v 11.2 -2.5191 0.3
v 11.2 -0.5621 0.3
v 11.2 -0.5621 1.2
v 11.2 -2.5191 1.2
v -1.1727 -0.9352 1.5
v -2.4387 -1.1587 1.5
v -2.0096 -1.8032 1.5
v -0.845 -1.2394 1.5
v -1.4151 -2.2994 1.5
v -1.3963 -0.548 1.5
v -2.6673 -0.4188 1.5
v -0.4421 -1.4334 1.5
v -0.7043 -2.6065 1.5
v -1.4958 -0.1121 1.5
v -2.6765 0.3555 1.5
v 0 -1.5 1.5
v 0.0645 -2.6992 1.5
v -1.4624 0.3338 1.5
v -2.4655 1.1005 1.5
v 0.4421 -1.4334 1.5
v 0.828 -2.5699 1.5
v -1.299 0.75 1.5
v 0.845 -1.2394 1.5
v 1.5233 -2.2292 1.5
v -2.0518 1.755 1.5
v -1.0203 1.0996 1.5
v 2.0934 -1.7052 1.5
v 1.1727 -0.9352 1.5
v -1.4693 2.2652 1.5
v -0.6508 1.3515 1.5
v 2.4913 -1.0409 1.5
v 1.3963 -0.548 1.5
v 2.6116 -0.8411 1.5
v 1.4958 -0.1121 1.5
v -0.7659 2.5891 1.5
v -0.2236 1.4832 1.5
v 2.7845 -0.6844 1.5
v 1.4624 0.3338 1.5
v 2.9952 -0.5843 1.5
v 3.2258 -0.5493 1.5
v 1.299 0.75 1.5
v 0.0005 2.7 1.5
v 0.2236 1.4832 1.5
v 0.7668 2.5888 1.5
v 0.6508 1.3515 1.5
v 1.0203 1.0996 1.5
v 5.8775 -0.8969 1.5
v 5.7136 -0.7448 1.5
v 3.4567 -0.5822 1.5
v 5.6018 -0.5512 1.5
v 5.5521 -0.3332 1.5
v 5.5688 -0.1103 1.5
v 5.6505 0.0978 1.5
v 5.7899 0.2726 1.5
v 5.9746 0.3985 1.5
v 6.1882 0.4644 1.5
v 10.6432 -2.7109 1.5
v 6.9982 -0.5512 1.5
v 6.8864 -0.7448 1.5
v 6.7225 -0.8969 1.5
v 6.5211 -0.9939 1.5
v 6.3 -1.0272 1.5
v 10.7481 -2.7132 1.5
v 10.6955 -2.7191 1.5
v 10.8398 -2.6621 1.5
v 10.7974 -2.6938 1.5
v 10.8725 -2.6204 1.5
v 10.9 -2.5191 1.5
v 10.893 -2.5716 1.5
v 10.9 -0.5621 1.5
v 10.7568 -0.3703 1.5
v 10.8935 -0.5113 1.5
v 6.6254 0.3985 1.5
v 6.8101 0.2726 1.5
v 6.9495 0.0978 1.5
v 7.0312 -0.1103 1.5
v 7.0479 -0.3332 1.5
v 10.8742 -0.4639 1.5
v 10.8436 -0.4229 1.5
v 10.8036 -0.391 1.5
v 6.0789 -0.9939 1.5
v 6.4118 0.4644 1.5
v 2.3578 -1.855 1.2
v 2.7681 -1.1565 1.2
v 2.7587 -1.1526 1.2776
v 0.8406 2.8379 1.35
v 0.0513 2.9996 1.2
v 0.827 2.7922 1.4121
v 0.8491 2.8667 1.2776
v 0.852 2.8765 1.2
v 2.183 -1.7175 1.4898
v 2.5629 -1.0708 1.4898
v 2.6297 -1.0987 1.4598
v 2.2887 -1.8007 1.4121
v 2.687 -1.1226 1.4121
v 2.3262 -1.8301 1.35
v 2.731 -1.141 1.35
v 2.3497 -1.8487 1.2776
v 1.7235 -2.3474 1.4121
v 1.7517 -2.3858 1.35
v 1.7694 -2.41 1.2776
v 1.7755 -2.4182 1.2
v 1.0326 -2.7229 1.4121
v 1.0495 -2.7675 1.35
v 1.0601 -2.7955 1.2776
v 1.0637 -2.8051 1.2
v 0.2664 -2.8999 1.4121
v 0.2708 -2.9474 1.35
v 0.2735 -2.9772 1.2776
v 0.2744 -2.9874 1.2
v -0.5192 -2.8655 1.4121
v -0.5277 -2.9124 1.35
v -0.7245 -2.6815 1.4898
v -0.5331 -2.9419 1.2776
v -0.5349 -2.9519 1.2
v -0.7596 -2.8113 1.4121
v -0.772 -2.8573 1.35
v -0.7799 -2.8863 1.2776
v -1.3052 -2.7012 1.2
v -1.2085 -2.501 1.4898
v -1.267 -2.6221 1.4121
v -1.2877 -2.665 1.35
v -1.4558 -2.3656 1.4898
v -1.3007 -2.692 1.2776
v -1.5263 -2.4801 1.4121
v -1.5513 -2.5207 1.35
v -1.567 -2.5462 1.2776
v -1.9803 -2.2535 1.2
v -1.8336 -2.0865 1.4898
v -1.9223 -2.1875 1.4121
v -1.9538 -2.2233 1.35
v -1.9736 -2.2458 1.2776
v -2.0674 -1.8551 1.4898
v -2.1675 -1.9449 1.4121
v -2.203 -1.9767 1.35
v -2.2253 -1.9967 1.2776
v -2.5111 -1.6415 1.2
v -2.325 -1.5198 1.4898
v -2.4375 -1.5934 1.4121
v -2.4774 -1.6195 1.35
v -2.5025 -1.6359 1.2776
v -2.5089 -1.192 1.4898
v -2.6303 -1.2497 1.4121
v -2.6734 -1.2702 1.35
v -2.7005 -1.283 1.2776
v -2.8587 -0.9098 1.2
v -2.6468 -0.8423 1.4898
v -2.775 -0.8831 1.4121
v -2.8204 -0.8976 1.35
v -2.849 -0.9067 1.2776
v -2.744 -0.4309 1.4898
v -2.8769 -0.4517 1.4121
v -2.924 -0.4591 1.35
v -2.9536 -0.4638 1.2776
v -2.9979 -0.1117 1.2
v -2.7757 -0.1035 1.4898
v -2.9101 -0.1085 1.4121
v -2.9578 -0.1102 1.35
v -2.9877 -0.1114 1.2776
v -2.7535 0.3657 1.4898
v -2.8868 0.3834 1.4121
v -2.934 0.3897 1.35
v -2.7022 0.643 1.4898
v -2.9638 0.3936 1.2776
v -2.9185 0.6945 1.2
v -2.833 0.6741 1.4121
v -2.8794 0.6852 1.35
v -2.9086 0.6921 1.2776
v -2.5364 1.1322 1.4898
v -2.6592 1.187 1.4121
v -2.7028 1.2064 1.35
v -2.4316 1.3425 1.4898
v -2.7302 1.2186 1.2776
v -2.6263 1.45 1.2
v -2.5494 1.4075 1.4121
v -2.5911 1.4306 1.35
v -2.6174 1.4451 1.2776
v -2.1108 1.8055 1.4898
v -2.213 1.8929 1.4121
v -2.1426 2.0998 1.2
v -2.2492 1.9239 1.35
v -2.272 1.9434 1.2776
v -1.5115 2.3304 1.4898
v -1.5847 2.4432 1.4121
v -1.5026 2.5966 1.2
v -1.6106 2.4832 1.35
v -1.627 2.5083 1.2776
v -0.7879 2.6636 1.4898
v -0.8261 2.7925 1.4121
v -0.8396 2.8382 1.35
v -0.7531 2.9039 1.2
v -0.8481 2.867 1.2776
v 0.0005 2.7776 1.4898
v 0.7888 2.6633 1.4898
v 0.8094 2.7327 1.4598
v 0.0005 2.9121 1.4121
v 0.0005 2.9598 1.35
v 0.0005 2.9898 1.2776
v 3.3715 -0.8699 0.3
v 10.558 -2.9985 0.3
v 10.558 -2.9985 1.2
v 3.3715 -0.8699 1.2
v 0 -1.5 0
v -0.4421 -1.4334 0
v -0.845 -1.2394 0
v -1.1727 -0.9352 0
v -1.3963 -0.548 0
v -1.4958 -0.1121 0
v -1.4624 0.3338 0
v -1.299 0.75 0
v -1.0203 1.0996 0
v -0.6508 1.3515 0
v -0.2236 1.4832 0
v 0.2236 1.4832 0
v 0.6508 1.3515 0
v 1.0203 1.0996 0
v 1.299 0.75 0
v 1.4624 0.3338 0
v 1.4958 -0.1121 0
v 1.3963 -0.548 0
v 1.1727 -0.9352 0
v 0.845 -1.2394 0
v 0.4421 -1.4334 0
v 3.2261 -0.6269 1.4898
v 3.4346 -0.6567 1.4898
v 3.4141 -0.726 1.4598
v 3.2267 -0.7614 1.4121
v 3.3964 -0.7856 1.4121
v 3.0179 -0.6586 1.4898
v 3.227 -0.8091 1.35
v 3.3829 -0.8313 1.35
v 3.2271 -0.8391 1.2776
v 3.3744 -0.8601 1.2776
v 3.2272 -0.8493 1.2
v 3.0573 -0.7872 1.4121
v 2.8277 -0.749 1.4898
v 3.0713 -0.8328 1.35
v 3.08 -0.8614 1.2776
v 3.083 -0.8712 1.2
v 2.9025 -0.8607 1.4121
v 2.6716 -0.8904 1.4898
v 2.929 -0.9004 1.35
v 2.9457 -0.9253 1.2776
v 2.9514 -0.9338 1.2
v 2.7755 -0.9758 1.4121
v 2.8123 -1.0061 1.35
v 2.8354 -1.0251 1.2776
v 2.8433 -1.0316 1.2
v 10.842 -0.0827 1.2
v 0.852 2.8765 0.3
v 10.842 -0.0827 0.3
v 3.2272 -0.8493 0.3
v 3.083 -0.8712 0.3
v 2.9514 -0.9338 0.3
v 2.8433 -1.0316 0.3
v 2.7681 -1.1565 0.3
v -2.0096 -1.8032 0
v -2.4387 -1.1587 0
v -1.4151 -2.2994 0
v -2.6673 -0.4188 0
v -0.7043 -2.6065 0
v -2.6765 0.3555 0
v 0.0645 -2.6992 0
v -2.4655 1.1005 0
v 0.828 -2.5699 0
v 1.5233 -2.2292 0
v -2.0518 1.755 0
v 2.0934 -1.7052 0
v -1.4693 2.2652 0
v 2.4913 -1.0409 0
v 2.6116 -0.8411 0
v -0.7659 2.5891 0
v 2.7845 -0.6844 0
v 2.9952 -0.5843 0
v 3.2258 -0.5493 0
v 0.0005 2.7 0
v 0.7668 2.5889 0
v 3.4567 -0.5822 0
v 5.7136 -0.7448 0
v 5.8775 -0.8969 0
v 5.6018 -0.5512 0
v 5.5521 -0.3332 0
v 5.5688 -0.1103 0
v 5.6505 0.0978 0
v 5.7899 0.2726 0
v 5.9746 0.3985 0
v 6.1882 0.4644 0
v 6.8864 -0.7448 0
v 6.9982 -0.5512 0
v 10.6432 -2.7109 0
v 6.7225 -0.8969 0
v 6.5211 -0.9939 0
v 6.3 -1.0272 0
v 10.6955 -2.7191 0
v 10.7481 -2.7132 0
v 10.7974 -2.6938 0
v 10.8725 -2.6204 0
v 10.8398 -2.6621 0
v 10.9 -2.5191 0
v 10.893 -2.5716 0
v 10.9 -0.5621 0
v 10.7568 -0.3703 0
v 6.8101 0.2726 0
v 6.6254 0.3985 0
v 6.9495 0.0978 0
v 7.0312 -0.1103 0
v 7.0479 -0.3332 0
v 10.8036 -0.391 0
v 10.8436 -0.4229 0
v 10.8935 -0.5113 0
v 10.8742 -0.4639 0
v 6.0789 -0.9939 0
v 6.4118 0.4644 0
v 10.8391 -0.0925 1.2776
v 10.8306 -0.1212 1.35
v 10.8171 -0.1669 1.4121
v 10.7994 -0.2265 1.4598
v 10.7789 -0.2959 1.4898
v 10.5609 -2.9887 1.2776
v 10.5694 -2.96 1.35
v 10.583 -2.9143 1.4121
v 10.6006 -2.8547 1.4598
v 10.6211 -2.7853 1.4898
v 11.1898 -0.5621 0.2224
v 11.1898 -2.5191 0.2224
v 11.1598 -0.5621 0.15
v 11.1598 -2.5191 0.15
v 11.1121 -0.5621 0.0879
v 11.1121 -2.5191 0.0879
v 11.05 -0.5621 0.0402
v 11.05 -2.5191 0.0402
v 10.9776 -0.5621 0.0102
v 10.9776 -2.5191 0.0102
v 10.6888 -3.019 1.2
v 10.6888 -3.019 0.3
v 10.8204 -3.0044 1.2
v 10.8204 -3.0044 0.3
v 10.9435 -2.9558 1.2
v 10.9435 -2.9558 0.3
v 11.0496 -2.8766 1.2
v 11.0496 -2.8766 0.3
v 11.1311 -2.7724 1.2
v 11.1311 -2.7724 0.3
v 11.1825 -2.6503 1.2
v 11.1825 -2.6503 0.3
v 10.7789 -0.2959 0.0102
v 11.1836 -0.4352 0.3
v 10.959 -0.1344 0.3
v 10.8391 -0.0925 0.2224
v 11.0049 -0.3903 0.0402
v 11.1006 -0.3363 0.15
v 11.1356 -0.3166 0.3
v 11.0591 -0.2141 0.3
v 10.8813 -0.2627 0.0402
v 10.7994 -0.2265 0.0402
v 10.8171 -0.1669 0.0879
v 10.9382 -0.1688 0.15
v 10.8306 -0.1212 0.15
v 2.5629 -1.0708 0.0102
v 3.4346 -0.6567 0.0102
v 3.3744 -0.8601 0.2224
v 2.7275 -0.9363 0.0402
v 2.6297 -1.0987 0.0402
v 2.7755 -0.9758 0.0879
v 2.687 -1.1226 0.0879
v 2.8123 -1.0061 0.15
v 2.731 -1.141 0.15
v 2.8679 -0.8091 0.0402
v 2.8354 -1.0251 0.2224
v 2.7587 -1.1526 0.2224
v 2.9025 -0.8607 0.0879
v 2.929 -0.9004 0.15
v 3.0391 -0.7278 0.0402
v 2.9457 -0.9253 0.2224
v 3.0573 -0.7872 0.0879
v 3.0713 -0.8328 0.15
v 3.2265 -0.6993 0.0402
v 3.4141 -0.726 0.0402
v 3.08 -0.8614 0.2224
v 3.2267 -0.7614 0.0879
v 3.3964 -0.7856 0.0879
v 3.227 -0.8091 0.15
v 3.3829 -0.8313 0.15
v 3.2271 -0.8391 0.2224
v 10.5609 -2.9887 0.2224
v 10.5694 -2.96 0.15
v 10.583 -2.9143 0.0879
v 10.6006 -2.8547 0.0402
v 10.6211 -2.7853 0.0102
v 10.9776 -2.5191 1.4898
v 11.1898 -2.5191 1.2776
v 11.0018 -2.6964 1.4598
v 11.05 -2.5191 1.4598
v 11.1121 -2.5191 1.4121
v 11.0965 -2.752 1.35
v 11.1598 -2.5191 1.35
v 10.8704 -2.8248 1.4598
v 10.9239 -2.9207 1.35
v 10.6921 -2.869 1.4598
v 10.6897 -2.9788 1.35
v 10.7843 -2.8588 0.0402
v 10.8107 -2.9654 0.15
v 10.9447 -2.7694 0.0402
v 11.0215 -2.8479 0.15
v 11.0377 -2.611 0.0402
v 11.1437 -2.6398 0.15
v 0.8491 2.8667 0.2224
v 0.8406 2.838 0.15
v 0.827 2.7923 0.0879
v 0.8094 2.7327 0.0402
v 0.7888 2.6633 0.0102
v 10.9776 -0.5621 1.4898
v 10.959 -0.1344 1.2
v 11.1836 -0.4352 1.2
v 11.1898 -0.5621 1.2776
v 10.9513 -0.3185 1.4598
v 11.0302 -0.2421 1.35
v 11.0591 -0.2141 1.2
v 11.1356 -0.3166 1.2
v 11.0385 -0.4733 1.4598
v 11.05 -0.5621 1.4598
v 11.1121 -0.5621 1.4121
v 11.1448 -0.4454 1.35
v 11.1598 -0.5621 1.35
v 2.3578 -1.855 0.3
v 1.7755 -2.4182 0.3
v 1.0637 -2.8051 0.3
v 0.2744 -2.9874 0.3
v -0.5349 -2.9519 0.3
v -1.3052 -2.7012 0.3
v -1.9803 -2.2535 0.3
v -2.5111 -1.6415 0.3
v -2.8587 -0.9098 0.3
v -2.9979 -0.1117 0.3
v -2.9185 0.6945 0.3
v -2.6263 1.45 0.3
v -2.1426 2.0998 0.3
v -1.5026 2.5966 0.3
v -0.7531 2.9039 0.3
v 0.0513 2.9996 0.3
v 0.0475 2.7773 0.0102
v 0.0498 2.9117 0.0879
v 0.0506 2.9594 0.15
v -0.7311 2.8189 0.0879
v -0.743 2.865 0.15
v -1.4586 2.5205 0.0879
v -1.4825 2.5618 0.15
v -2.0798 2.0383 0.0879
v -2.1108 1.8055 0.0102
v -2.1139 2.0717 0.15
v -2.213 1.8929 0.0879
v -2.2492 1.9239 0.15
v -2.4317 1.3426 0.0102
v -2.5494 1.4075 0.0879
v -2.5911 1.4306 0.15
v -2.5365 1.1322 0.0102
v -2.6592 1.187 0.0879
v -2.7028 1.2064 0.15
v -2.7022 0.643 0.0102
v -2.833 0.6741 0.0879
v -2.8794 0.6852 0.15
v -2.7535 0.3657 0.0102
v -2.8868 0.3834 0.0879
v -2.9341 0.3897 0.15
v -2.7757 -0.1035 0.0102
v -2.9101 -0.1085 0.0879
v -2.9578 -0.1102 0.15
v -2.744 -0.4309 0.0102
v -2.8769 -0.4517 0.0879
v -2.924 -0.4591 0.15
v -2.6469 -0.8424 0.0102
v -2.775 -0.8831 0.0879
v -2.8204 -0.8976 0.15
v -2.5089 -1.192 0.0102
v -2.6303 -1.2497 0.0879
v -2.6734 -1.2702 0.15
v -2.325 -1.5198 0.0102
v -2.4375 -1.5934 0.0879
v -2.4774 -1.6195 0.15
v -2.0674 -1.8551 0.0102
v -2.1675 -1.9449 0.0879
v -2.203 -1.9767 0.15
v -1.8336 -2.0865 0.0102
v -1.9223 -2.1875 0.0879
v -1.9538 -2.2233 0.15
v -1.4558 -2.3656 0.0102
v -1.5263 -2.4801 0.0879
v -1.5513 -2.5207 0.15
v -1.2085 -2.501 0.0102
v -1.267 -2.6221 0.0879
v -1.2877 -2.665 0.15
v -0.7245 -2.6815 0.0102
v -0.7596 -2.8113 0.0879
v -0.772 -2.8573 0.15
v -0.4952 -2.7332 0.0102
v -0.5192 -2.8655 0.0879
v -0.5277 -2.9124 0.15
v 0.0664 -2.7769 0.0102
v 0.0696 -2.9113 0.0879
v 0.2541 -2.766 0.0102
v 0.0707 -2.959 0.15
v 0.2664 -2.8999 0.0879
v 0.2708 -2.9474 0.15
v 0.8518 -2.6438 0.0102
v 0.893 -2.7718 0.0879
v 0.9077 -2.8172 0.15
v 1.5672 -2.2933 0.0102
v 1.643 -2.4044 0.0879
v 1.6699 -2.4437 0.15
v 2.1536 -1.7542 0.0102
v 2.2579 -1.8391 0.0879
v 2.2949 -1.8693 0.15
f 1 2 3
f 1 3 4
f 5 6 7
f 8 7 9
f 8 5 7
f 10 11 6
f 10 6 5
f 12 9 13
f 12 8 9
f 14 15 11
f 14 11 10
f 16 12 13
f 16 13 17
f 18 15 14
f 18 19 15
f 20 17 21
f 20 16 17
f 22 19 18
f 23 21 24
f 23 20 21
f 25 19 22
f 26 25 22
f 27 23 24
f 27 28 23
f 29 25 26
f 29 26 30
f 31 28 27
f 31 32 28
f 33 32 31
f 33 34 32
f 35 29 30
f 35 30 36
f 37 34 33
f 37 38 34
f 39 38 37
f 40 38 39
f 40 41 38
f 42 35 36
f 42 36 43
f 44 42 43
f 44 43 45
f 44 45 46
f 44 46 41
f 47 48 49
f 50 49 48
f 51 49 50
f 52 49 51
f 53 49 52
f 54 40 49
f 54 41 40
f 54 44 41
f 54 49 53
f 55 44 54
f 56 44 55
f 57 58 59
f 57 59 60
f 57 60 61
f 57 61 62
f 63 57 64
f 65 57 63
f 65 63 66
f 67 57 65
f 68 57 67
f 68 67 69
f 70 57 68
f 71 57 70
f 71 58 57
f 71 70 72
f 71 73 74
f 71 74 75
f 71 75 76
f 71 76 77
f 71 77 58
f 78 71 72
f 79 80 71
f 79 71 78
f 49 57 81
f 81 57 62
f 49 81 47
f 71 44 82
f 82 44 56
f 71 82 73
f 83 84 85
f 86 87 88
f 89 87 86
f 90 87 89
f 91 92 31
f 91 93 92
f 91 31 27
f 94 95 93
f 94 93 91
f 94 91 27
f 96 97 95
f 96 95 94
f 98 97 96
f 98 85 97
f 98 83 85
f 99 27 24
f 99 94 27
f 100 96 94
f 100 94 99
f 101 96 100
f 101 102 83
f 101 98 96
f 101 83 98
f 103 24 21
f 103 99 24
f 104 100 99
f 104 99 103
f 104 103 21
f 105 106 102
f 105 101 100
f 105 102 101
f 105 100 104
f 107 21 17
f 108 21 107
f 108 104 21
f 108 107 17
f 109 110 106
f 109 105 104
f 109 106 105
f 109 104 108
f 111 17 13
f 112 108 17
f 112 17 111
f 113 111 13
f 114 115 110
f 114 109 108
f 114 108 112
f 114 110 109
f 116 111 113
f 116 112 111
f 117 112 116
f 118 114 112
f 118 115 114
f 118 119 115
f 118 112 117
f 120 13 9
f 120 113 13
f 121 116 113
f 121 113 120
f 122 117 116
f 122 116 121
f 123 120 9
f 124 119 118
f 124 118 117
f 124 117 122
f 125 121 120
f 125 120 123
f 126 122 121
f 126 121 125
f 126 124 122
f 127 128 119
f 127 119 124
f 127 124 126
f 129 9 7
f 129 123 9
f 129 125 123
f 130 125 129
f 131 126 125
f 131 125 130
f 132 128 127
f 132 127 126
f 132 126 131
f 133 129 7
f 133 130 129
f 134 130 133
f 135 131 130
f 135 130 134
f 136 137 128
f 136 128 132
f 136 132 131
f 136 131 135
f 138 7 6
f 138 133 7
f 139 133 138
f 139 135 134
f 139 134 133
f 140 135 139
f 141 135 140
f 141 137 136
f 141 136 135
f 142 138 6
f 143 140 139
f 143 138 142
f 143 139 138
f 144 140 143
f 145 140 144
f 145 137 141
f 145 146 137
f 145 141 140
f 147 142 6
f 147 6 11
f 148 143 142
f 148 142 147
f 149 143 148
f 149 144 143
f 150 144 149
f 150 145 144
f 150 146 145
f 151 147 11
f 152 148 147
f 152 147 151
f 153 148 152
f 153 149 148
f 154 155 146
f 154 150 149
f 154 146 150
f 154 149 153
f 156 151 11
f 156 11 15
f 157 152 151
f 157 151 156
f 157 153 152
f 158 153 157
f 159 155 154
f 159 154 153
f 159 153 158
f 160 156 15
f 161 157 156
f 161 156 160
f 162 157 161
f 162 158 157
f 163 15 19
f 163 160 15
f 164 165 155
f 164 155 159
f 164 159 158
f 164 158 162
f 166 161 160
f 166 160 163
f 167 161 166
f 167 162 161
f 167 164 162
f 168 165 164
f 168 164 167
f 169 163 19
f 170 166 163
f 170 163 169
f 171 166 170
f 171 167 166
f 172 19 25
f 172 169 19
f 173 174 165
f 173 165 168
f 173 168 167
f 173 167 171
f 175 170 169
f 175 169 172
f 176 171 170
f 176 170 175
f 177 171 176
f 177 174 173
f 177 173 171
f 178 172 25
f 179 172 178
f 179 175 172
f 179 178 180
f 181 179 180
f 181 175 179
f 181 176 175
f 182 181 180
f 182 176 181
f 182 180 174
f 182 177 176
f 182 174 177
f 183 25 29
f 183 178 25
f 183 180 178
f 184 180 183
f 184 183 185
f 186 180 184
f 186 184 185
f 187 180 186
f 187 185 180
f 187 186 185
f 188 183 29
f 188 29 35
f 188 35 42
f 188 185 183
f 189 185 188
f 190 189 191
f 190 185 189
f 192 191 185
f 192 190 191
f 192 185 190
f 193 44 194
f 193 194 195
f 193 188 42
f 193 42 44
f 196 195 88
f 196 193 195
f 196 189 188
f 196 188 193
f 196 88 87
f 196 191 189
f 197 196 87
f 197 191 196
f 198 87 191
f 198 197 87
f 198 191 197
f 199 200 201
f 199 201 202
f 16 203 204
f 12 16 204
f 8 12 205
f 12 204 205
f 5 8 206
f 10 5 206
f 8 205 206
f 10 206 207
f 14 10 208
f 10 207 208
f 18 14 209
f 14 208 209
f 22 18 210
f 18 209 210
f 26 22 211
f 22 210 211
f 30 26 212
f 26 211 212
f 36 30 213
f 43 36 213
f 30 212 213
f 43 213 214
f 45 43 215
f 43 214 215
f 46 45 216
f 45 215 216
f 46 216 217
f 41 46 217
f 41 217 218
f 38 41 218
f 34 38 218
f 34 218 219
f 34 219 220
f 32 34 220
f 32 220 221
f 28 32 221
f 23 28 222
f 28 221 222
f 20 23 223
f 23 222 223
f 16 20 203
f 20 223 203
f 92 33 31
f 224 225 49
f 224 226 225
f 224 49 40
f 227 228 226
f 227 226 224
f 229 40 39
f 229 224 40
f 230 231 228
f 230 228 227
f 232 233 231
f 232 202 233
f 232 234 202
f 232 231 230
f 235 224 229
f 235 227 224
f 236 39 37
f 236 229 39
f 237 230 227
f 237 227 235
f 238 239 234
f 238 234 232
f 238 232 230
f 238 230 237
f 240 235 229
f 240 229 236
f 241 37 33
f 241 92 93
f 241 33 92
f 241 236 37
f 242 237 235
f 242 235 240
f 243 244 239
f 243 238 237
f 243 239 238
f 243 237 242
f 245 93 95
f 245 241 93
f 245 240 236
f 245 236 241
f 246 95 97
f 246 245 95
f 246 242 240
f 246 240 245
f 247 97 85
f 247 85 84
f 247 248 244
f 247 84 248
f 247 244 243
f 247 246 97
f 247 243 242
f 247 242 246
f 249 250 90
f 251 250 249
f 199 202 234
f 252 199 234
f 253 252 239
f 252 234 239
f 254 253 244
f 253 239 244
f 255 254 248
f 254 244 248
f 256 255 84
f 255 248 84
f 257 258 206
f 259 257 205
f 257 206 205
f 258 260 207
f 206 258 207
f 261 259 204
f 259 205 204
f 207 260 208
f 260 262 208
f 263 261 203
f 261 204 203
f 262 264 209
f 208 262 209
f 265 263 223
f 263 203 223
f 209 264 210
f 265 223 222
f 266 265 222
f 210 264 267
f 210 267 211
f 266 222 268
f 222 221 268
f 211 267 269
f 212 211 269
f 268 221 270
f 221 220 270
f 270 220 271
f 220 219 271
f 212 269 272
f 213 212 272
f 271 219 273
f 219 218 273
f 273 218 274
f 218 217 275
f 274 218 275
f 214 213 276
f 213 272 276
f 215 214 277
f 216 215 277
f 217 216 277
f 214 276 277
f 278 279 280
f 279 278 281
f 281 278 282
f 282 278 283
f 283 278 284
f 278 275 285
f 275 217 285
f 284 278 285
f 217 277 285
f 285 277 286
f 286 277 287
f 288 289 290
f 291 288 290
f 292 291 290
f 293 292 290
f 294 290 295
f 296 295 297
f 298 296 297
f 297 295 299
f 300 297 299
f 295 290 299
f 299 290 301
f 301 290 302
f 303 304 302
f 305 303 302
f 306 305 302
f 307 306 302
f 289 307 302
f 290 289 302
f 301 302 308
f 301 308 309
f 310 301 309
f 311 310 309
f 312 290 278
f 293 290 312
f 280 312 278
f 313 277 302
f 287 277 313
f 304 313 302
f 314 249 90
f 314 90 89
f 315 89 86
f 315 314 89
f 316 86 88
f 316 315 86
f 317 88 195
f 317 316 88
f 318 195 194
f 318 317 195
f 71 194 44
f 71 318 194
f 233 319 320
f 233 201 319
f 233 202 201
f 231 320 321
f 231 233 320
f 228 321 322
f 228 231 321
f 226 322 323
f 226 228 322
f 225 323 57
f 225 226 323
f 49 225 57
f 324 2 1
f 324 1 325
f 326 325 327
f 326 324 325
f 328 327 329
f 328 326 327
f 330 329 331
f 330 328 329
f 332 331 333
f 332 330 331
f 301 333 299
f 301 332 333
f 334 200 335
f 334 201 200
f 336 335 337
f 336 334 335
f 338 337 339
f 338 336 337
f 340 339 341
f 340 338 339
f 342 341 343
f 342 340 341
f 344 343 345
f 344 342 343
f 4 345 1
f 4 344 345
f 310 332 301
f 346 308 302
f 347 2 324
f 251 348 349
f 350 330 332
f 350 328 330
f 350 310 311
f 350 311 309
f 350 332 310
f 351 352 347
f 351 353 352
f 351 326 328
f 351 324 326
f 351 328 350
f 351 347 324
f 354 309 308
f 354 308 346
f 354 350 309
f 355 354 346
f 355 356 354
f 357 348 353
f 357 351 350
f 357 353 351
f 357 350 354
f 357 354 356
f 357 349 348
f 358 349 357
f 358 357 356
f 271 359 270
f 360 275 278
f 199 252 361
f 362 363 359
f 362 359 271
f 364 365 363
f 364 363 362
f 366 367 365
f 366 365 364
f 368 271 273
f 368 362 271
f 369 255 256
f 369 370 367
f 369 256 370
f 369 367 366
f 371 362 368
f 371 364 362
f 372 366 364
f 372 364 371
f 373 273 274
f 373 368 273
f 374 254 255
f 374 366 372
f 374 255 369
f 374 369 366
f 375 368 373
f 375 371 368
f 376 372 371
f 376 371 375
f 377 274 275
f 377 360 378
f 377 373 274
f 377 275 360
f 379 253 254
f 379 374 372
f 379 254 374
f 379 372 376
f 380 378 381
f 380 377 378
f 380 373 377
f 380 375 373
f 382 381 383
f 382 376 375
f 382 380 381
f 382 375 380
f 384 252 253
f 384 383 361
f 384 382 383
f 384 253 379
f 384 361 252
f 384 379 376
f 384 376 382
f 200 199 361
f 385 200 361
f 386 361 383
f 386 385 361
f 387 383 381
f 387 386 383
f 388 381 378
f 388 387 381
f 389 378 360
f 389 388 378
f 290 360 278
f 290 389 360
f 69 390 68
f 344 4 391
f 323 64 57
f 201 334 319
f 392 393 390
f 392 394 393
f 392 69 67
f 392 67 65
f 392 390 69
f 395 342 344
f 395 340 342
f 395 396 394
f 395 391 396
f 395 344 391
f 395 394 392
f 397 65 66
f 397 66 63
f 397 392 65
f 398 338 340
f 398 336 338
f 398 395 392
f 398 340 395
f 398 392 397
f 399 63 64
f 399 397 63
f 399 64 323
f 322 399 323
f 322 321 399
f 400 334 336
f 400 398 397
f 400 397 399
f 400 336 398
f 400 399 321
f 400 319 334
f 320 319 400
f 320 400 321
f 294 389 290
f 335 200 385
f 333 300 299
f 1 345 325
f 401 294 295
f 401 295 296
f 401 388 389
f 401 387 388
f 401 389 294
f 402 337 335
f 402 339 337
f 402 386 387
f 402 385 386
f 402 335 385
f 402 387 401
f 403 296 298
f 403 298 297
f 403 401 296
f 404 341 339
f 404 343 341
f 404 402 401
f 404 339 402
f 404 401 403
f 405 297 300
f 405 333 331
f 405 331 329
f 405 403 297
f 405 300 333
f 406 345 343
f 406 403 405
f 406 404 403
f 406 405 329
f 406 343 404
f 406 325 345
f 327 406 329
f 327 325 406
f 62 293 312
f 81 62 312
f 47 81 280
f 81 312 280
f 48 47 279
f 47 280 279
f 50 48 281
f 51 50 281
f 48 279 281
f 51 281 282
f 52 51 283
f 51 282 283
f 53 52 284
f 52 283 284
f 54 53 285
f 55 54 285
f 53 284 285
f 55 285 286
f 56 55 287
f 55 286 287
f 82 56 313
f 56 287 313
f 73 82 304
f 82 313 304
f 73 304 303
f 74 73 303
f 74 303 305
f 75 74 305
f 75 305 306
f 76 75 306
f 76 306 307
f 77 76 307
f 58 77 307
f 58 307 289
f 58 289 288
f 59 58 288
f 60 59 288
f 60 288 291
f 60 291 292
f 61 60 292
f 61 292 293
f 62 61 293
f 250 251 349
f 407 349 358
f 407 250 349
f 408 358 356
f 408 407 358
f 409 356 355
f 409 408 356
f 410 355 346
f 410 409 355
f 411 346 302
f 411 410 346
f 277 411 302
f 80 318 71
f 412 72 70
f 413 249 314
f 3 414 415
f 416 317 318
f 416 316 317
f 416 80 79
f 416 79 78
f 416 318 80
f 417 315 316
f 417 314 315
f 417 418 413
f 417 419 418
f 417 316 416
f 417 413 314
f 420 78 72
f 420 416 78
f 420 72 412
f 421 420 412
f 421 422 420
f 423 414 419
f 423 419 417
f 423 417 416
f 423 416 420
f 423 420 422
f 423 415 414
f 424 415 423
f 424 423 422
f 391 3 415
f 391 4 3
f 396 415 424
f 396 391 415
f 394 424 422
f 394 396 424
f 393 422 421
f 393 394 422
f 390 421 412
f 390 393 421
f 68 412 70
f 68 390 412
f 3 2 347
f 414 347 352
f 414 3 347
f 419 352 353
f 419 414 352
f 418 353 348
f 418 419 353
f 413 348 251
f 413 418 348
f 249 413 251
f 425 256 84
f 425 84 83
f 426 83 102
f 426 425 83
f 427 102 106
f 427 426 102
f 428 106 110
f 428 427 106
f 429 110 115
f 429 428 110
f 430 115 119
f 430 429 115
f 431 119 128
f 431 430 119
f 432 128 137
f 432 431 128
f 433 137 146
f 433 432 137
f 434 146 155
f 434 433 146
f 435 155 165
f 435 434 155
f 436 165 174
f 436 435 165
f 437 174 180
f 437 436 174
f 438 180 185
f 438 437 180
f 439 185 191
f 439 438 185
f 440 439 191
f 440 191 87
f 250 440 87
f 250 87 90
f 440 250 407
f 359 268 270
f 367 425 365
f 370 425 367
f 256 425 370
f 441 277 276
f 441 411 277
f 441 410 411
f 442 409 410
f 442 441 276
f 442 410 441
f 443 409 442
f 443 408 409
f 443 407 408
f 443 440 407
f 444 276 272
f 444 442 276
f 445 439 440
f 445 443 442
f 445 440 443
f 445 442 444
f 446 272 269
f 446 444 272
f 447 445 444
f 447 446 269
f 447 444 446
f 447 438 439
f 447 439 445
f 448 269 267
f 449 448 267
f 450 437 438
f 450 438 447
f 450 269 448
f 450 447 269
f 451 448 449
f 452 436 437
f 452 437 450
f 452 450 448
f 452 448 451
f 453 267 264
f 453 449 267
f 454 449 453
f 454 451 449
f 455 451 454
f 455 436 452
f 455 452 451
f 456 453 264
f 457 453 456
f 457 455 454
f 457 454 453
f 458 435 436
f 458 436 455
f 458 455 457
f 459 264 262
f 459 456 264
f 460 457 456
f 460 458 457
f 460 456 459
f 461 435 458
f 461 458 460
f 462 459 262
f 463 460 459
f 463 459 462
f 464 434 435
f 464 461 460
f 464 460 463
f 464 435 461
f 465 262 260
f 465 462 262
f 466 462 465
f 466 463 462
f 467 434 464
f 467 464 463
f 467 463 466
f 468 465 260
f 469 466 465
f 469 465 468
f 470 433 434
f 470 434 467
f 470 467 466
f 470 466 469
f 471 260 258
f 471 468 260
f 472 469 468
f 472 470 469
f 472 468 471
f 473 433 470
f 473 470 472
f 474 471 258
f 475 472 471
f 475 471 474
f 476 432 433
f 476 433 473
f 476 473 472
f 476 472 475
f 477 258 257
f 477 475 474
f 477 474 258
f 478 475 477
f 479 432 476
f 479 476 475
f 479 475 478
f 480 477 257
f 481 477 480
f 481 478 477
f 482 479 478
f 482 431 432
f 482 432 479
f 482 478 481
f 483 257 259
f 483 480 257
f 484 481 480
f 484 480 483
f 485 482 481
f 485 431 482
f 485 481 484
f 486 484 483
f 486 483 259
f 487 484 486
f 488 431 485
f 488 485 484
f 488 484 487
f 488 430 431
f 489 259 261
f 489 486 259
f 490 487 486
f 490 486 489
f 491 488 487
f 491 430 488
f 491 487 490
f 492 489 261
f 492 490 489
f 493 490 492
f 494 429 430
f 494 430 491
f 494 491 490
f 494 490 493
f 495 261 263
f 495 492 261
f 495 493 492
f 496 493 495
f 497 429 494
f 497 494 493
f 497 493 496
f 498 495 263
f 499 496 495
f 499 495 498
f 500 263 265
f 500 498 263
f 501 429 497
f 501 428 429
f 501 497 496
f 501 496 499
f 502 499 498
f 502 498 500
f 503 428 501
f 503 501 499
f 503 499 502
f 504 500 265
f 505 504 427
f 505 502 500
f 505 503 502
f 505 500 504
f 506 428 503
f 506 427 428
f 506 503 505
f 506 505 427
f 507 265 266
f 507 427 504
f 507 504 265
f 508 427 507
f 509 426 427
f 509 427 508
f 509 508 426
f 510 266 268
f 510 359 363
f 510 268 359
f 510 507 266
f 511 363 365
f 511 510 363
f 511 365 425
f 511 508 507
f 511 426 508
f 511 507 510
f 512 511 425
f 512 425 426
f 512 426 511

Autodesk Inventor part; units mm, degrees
ref_plane "YZ Plane" through (0, 0, 0) normal (1, 0, 0) x (0, 1, 0)
ref_plane "XZ Plane" through (0, 0, 0) normal (0, 1, 0) x (-1, 0, 0)
ref_plane "XY Plane" through (0, 0, 0) normal (0, 0, 1) x (1, 0, 0)
sketch "Sketch1" plane through (0, 0, 0) normal (0, 0, 1) x (1, 0, 0)
  circle A0 centre (0, 0) radius 3
  line L0 (0.852, 2.8765) -> (11.2, -0.1887)
  line L1 (11.2, -0.1887) -> (11.2, -3.1887)
  line L2 (11.2, -3.1887) -> (2.9091, -0.7329)
  line L3 (0, 0) -> (-3, 0) construction
  dimension "d0" = 11.2
  dimension "d1" = 16.5
  dimension "d2" = 6
  dimension "d3" = 3
extrude "Extrusion1" add sketch "Sketch1" along normal blind 1.5
fillet "Fillet1" radius 0.5 3 edges at (2.9091, -0.7329, 0.75) (11.2, -3.1887, 0.75) (11.2, -0.1887, 0.75)
sketch "Sketch2" plane through (0, 0, 1.5) normal (0, 0, 1) x (1, 0, 0)
  line L0 (10.558, -2.9986) -> (3.3715, -0.8698) projected
  point P0 (0, 0)
  point P1 (6.3, -0.2772)
  dimension "d7" = 1.4
  dimension "d8" = 6.3
hole "Hole1" at (6.3, -0.2772, 1.5) direction (0, 0, -1) diameter 1.5 end through all
hole "Hole2" at (0, 0, 1.5) direction (0, 0, -1) diameter 3 end through all
fillet "Fillet2" radius 0.3 14 edges at (11.1006, -0.2629, 1.5) (11.2, -1.5406, 1.5) (10.9992, -2.9198, 1.5) (6.9647, -1.9342, 1.5) (3.0149, -0.8976, 1.5) (-2.7097, -1.2874, 1.5) (5.847, 1.3969, 1.5) (10.9992, -2.9198, 0) (11.2, -1.5406, 0) (11.1006, -0.2629, 0) (5.847, 1.3969, 0) (-2.7097, -1.2874, 0) (3.0149, -0.8976, 0) (6.9647, -1.9342, 0)
properties part number "403-05" material "Steel, Mild"
